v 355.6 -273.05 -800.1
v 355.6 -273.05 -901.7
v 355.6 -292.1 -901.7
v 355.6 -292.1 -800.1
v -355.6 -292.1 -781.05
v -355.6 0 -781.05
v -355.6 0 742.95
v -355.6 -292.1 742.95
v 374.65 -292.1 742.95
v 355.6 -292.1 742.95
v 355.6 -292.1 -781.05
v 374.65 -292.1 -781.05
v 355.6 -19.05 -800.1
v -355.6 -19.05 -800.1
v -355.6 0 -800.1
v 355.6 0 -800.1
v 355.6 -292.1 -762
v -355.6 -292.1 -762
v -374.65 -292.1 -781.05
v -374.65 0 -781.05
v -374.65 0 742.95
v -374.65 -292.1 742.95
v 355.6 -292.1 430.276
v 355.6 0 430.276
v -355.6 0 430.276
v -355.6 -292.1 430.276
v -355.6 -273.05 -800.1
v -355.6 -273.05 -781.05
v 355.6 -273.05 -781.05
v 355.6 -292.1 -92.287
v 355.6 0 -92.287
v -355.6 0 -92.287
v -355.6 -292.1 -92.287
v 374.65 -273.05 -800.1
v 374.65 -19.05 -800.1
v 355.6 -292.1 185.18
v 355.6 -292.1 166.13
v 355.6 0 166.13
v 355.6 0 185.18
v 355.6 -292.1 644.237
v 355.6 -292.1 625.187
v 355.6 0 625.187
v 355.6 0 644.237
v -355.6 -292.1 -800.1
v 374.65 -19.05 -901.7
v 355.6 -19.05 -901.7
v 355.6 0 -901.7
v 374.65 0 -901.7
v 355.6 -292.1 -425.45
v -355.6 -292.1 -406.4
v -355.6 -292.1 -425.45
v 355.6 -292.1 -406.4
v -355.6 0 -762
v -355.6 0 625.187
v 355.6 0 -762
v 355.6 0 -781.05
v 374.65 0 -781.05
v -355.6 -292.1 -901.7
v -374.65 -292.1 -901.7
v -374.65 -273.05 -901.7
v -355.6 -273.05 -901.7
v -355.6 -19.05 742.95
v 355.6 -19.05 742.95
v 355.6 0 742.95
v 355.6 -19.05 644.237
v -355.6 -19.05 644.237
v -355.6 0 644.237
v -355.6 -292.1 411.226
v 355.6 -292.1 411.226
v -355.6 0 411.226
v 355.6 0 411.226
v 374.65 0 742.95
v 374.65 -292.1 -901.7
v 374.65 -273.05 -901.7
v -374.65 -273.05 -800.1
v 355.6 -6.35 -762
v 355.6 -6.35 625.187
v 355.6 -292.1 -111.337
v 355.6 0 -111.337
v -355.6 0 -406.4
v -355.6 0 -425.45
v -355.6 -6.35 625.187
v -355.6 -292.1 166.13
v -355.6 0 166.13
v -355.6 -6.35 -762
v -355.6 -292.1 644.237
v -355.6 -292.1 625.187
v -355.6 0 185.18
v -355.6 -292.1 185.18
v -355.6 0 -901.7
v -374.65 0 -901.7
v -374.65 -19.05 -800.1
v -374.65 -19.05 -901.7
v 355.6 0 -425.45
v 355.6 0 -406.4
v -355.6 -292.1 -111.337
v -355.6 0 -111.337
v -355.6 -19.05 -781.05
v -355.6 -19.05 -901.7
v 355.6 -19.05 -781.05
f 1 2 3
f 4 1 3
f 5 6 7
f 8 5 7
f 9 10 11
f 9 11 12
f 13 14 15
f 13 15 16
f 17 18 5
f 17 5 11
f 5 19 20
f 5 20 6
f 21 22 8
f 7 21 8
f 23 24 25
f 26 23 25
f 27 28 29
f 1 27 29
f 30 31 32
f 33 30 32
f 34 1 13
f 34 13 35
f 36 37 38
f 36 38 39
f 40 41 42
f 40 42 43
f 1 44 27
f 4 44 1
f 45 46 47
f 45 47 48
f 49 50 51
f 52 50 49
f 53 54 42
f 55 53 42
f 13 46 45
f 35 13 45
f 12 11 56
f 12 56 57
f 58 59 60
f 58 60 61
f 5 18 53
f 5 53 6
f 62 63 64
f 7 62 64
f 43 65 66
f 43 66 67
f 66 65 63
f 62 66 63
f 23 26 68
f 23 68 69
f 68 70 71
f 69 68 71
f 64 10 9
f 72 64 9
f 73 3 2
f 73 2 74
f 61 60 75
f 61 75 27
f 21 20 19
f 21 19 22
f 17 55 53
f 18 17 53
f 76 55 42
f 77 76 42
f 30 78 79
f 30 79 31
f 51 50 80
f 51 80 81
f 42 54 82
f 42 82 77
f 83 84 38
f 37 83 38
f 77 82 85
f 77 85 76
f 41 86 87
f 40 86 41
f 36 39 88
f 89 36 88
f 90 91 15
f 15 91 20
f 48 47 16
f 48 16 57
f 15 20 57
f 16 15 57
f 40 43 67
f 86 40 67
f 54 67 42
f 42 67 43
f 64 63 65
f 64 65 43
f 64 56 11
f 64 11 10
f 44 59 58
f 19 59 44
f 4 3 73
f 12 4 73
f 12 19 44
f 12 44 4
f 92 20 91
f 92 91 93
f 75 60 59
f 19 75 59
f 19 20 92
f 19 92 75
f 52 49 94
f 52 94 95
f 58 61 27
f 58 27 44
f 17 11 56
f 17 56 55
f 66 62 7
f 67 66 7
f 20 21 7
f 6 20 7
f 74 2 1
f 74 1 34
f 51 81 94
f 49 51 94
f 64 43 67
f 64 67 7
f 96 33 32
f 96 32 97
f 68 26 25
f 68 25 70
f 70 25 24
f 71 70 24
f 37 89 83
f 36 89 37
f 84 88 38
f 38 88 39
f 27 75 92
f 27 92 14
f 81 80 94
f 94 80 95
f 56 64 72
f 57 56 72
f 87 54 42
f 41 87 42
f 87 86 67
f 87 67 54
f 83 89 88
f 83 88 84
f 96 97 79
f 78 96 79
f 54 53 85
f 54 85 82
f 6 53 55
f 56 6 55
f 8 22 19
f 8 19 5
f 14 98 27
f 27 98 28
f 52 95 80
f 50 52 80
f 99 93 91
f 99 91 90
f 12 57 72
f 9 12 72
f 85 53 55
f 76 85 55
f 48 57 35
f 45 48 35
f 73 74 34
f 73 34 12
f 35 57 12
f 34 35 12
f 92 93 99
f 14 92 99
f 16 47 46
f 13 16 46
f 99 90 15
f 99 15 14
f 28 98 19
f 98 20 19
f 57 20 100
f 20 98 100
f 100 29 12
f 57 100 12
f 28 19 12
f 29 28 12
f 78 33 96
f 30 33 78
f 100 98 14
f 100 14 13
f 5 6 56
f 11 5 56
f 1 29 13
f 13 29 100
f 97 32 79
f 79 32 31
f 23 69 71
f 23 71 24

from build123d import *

# Parameters (mm, degrees)
F1_DEPTH  = 292.1
F2_W      = 19.05
F2_H      = 1524
F3_DEPTH  = 292.1
F4_W      = 19.05
F4_H      = 98.713074
F5_DEPTH  = 711.2
F6_W      = 711.2
F6_H      = 19.05
F7_DEPTH  = 19.05
F8_W      = 19.05
F8_H      = 19.05
F9_DEPTH  = 101.6
F10_W     = 711.2
F10_H     = 1387.186926
F11_DEPTH = 6.35


with BuildPart() as f1:
    # F0 (on Front) → F1 (new body)
    with BuildSketch(Plane.XZ):
        Polygon((0, -762), (-355.6, -762), (-355.6, -781.05), (355.6, -781.05), (355.6, -762), align=None)
        Polygon((164.060975, 644.236926), (161.838475, 625.186926), (355.6, 625.186926), (355.6, 644.236926), align=None)
        Polygon((139.098839, 430.275765), (136.876339, 411.225765), (355.6, 411.225765), (355.6, 430.275765), align=None)
        Polygon((-355.6, 430.275765), (-355.6, 411.225765), (136.876339, 411.225765), (139.098839, 430.275765), align=None)
        Polygon((110.504346, 185.180111), (108.281846, 166.130111), (355.6, 166.130111), (355.6, 185.180111), align=None)
        Polygon((-355.6, 185.180111), (-355.6, 166.130111), (108.281846, 166.130111), (110.504346, 185.180111), align=None)
        Polygon((78.133222, -92.286667), (75.910722, -111.336667), (355.6, -111.336667), (355.6, -92.286667), align=None)
        Polygon((-355.6, -92.286667), (-355.6, -111.336667), (75.910722, -111.336667), (78.133222, -92.286667), align=None)
        Polygon((41.486667, -406.4), (39.264167, -425.45), (355.6, -425.45), (355.6, -406.4), align=None)
        Polygon((-355.6, -406.4), (-355.6, -425.45), (39.264167, -425.45), (41.486667, -406.4), align=None)
        Polygon((-355.6, 644.236926), (-355.6, 625.186926), (161.838475, 625.186926), (164.060975, 644.236926), align=None)
    extrude(amount=F1_DEPTH)


with BuildPart() as f3:
    # F2 (on Front) → F3 (new body)
    with BuildSketch(Plane.XZ):
        with Locations((-365.125, -19.05)):
            Rectangle(F2_W, F2_H)
        with Locations((365.125, -19.05)):
            Rectangle(F2_W, F2_H)
    extrude(amount=F3_DEPTH)


with BuildPart() as f5:
    # F4 (on face) → F5 (new body)
    with BuildSketch(Plane.YZ.offset(-355.6)):
        with Locations((-9.525, 693.593463)):
            Rectangle(F4_W, F4_H)
    extrude(amount=F5_DEPTH)


with BuildPart() as f7:
    # F6 (on face) → F7 (new body)
    with BuildSketch(Plane(origin=(0, 0, -781.05), x_dir=(1, 0, 0), z_dir=(0, 0, -1))):
        with Locations((0, 282.575)):
            Rectangle(F6_W, F6_H)
        Polygon((-355.6, 292.1), (-374.65, 292.1), (-374.65, 0), (-355.6, 0), (-355.6, 19.05), (-355.6, 273.05), align=None)
        with Locations((0, 9.525)):
            Rectangle(F6_W, F6_H)
        Polygon((374.65, 292.1), (355.6, 292.1), (355.6, 273.05), (355.6, 19.05), (355.6, 0), (374.65, 0), align=None)
    extrude(amount=F7_DEPTH)

    # F8 (on face) → F9 (join)
    with BuildSketch(Plane(origin=(0, 0, -800.1), x_dir=(1, 0, 0), z_dir=(0, 0, -1))):
        with Locations((-365.125, 282.575)):
            Rectangle(F8_W, F8_H)
        with Locations((-365.125, 9.525)):
            Rectangle(F8_W, F8_H)
        with Locations((365.125, 9.525)):
            Rectangle(F8_W, F8_H)
        with Locations((365.125, 282.575)):
            Rectangle(F8_W, F8_H)
    extrude(amount=F9_DEPTH)


with BuildPart() as f11:
    # F10 (on Front) → F11 (new body)
    with BuildSketch(Plane.XZ):
        with Locations((0, -68.406537)):
            Rectangle(F10_W, F10_H)
    extrude(amount=F11_DEPTH)


solid = Compound([f1.part, f3.part, f5.part, f7.part, f11.part])
